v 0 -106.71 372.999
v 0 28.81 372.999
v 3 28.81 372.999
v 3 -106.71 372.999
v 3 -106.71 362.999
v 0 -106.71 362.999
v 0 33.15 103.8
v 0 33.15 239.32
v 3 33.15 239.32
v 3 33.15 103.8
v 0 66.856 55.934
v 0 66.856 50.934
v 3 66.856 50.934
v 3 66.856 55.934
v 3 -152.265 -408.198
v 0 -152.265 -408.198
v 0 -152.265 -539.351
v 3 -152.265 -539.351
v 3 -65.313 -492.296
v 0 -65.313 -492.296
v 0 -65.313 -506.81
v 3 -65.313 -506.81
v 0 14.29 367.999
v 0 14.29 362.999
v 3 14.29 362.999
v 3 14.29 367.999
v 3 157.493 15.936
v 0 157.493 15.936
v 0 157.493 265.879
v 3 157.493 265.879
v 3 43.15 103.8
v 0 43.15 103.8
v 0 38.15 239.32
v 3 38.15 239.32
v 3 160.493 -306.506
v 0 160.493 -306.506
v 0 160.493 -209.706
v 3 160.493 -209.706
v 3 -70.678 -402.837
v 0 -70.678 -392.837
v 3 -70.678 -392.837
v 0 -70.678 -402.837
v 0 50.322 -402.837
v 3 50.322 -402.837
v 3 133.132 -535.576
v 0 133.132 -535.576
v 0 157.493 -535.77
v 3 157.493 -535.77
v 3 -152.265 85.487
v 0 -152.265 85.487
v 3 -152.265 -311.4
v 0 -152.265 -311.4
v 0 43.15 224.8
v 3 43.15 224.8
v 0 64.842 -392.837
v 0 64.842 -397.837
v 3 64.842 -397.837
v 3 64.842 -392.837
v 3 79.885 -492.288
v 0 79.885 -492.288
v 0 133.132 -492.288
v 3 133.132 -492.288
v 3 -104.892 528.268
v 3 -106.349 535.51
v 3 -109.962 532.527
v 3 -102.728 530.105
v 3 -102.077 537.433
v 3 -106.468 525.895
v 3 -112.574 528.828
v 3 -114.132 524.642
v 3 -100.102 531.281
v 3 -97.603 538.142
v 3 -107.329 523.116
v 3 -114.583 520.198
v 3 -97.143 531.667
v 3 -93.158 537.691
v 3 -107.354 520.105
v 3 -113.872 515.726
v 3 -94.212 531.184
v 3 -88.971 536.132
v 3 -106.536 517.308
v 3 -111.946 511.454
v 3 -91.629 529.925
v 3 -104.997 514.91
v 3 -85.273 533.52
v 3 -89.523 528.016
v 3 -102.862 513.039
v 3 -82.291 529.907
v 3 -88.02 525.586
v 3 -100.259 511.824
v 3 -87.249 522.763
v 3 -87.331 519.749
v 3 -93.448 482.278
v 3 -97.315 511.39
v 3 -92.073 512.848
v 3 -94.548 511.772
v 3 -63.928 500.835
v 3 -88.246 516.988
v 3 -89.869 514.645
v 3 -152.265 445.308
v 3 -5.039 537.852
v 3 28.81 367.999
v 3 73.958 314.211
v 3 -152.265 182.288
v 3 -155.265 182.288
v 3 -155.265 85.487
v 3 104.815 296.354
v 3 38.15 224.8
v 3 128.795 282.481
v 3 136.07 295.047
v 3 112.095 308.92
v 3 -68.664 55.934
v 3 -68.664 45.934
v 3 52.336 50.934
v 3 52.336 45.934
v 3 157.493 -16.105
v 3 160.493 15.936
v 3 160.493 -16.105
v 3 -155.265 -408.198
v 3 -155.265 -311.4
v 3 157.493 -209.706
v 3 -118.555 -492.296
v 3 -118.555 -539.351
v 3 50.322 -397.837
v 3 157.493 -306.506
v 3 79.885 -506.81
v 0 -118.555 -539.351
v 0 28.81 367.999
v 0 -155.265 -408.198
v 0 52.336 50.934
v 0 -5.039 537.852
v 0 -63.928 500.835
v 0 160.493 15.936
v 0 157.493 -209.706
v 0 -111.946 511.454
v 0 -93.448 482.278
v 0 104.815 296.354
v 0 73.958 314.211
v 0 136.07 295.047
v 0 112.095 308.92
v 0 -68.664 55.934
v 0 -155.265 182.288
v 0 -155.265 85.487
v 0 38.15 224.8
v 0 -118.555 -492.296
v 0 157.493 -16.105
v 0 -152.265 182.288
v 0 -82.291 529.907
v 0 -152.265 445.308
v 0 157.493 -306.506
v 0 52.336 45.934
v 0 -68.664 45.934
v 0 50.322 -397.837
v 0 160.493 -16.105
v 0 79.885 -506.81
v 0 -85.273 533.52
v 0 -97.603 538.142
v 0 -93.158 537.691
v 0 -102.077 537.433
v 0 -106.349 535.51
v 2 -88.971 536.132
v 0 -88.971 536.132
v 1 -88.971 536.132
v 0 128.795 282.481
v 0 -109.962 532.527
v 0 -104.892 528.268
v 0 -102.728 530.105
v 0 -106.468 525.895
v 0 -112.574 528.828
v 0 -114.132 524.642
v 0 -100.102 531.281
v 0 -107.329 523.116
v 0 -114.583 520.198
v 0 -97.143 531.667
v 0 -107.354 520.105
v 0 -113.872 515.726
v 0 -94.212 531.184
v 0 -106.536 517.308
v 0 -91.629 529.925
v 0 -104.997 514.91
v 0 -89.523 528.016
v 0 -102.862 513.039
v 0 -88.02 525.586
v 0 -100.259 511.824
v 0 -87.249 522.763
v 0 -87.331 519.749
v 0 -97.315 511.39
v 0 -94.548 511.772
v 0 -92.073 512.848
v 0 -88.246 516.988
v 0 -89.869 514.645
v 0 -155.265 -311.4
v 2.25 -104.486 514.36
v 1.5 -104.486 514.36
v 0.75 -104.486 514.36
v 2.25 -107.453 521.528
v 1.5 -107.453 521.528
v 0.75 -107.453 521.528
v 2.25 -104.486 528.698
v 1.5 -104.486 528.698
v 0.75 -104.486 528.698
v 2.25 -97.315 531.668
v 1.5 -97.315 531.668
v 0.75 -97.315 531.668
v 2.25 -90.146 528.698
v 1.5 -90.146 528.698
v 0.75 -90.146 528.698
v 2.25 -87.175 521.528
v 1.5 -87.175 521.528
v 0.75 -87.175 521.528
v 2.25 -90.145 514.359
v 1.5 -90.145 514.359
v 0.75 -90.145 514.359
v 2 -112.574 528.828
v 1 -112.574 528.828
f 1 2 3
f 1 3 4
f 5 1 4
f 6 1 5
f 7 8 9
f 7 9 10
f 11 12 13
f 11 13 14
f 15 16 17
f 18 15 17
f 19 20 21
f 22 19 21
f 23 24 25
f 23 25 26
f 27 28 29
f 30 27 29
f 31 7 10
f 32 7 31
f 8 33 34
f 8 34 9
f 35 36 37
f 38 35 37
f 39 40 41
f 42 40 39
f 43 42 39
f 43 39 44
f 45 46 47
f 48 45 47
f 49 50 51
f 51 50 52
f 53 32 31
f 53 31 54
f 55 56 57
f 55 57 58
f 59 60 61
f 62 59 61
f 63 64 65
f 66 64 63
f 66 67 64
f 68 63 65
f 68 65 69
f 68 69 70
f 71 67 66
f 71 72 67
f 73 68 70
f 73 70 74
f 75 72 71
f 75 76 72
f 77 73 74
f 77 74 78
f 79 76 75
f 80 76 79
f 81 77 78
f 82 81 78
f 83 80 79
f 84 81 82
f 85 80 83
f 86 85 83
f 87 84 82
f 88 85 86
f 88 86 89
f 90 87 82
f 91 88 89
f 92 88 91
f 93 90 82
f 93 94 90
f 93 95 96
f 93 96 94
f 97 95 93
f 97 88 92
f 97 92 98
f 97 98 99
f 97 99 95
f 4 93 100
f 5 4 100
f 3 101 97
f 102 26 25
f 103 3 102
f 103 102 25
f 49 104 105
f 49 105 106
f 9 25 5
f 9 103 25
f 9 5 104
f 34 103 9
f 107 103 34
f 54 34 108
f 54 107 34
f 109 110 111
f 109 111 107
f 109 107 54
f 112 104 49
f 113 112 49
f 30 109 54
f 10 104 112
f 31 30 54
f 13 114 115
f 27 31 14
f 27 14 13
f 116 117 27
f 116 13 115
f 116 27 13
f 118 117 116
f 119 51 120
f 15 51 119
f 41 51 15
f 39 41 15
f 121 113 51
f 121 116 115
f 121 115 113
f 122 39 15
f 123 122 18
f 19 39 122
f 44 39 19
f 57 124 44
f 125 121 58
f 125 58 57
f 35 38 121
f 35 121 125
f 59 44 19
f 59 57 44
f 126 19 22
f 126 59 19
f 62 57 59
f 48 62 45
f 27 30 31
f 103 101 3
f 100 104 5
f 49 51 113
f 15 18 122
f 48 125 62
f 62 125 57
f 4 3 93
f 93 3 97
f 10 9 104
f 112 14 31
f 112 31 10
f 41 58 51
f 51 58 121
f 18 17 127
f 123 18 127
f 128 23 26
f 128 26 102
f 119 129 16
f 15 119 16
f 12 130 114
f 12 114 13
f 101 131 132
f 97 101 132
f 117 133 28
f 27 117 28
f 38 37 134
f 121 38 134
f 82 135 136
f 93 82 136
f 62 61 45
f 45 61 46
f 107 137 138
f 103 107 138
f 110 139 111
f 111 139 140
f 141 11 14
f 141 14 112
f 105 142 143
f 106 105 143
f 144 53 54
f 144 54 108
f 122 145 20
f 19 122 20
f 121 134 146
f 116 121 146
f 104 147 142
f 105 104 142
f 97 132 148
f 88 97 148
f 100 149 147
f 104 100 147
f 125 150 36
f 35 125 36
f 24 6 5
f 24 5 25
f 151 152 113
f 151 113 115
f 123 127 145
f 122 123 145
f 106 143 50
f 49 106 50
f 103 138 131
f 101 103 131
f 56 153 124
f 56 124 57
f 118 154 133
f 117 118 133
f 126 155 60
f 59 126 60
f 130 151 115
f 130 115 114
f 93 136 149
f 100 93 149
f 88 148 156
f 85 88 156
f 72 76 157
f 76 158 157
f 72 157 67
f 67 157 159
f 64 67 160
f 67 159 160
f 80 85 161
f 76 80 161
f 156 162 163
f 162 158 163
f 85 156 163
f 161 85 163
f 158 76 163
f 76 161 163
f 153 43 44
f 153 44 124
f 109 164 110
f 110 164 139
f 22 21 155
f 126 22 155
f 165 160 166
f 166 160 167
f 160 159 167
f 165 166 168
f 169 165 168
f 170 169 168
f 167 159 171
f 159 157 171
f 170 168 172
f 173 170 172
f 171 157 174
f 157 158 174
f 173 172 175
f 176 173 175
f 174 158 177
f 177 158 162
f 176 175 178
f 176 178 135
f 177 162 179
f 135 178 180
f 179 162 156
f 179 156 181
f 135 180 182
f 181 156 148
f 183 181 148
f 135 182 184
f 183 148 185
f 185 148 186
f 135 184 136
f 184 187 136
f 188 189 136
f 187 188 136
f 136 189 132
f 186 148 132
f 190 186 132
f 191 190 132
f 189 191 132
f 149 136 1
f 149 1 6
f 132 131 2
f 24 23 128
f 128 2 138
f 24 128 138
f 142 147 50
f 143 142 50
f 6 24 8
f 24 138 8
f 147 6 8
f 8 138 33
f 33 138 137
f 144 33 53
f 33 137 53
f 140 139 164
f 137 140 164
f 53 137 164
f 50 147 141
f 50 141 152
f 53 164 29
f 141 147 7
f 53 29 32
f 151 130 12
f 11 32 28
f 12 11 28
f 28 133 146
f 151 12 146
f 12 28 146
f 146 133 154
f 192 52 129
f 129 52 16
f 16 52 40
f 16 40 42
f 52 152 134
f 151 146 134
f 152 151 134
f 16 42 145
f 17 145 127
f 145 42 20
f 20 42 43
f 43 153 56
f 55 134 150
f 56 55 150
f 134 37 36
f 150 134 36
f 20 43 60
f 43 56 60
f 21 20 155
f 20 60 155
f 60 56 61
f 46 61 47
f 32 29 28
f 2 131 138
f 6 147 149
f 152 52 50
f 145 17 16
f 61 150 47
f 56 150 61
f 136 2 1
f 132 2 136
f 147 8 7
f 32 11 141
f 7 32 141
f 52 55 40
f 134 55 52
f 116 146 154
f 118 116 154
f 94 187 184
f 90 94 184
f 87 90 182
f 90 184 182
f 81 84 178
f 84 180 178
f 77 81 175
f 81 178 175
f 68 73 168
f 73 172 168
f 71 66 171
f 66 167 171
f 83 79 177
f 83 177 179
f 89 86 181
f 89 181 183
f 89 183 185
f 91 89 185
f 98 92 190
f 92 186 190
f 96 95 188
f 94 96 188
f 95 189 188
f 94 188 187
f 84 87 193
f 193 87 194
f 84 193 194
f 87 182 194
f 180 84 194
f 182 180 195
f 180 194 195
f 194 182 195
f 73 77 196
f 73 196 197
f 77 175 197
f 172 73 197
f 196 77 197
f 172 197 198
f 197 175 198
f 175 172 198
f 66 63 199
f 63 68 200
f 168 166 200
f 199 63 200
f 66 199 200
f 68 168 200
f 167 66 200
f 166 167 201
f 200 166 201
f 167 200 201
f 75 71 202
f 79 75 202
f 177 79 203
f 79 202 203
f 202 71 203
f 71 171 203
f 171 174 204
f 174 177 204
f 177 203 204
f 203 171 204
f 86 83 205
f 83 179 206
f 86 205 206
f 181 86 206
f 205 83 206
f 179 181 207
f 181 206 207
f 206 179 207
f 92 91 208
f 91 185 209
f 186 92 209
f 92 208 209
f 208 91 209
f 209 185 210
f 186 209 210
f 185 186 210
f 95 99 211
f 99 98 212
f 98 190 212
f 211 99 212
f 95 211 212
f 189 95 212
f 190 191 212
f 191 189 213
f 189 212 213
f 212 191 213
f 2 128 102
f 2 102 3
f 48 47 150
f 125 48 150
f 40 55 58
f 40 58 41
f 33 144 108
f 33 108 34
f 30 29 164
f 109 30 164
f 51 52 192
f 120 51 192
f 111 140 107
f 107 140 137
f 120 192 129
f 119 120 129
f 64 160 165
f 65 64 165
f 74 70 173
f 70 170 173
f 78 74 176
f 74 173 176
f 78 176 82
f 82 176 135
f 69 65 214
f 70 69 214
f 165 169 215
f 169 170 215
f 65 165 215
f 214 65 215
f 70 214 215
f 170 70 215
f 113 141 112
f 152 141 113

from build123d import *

# Parameters (mm, degrees)
BOSS_EXTRUDE1_DEPTH = 3


with BuildPart() as part:
    # Sketch1 → Boss-Extrude1 (new body)
    with BuildSketch(Plane(origin=(0, 0, 0), x_dir=(0, 0, -1), z_dir=(1, 0, 0))):
        with BuildLine():
            Line((16.10495, 157.49285), (16.10495, 160.49285))
            Line((16.10495, 160.49285), (-15.93645, 160.49285))
            Line((-15.93645, 160.49285), (-15.93645, 157.49285))
            Line((-15.93645, 157.49285), (-265.87855, 157.49285))
            Line((-265.87855, 157.49285), (-282.48125, 128.79465))
            Line((-282.48125, 128.79465), (-295.04705, 136.06965))
            Line((-295.04705, 136.06965), (-308.92005, 112.09525))
            Line((-308.92005, 112.09525), (-296.35425, 104.81525))
            Line((-296.35425, 104.81525), (-314.21085, 73.95765))
            Line((-314.21085, 73.95765), (-537.85245, -5.03885))
            Line((-537.85245, -5.03885), (-500.83535, -63.92765))
            Line((-500.83535, -63.92765), (-529.90705, -82.29115))
            add(Edge.make_bspline(
                [(-529.90705, -82.29115), (-538.09755, -87.38345), (-540.60535, -98.15845), (-535.50965, -106.34895)],
                knots=[0, 0, 0, 0, 1, 1, 1, 1], degree=3))
            add(Edge.make_bspline(
                [(-535.50965, -106.34895), (-530.41395, -114.53935), (-519.64405, -117.04885), (-511.45355, -111.94645)],
                knots=[0, 0, 0, 0, 1, 1, 1, 1], degree=3))
            Line((-511.45355, -111.94645), (-482.27845, -93.44795))
            Line((-482.27845, -93.44795), (-445.30805, -152.26515))
            Line((-445.30805, -152.26515), (-182.28825, -152.26515))
            Line((-182.28825, -152.26515), (-182.28825, -155.26515))
            Line((-182.28825, -155.26515), (-85.48695, -155.26515))
            Line((-85.48695, -155.26515), (-85.48695, -152.26515))
            Line((-85.48695, -152.26515), (311.39965, -152.26515))
            Line((311.39965, -152.26515), (311.39965, -155.26515))
            Line((311.39965, -155.26515), (408.19765, -155.26515))
            Line((408.19765, -155.26515), (408.19765, -152.26515))
            Line((408.19765, -152.26515), (539.35145, -152.26515))
            Line((539.35145, -152.26515), (539.35145, -118.55455))
            Line((539.35145, -118.55455), (492.29645, -118.55455))
            Line((492.29645, -118.55455), (492.29645, -65.31325))
            Line((492.29645, -65.31325), (506.80985, -65.31325))
            Line((506.80985, -65.31325), (506.80985, 79.88545))
            Line((506.80985, 79.88545), (492.28815, 79.88545))
            Line((492.28815, 79.88545), (492.28815, 133.13165))
            Line((492.28815, 133.13165), (535.57645, 133.13165))
            Line((535.57645, 133.13165), (535.76985, 157.49285))
            Line((535.76985, 157.49285), (306.50565, 157.49285))
            Line((306.50565, 157.49285), (306.50565, 160.49285))
            Line((306.50565, 160.49285), (209.70605, 160.49285))
            Line((209.70605, 160.49285), (209.70605, 157.49285))
            Line((209.70605, 157.49285), (16.10495, 157.49285))
        make_face()
        Polygon((-239.31955, 33.14975), (-103.79955, 33.14975), (-103.79955, 43.14975), (-224.79955, 43.14975), (-224.79955, 38.14975), (-239.31955, 38.14975), align=None, mode=Mode.SUBTRACT)
        Polygon((-55.93395, 66.85645), (-55.93395, -68.66355), (-45.93395, -68.66355), (-45.93395, 52.33645), (-50.93395, 52.33645), (-50.93395, 66.85645), align=None, mode=Mode.SUBTRACT)
        Polygon((-372.99945, 28.80995), (-372.99945, -106.71005), (-362.99945, -106.71005), (-362.99945, 14.28995), (-367.99945, 14.28995), (-367.99945, 28.80995), align=None, mode=Mode.SUBTRACT)
        Polygon((392.83665, 64.84155), (392.83665, -70.67845), (402.83665, -70.67845), (402.83665, 50.32155), (397.83665, 50.32155), (397.83665, 64.84155), align=None, mode=Mode.SUBTRACT)
        with BuildLine():
            add(Edge.make_bspline(
                [(-521.52825, -107.45275), (-527.12745, -107.45275), (-531.66795, -102.92065), (-531.66795, -97.31475)],
                knots=[0, 0, 0, 0, 0.333333333, 0.333333333, 0.333333333, 0.333333333], degree=3))
            add(Edge.make_bspline(
                [(-531.66795, -97.31475), (-531.66795, -91.71715), (-527.12915, -87.17505), (-521.52825, -87.17505)],
                knots=[0.333333333, 0.333333333, 0.333333333, 0.333333333, 1, 1, 1, 1], degree=3))
            add(Edge.make_bspline(
                [(-521.52825, -87.17505), (-515.92735, -87.17505), (-511.39025, -91.71385), (-511.39025, -97.31475)],
                knots=[0, 0, 0, 0, 0.333333333, 0.333333333, 0.333333333, 0.333333333], degree=3))
            add(Edge.make_bspline(
                [(-511.39025, -97.31475), (-511.39025, -102.92065), (-515.92895, -107.45275), (-521.52825, -107.45275)],
                knots=[0.333333333, 0.333333333, 0.333333333, 0.333333333, 1, 1, 1, 1], degree=3))
        make_face(mode=Mode.SUBTRACT)
    extrude(amount=BOSS_EXTRUDE1_DEPTH)


solid = part.part
